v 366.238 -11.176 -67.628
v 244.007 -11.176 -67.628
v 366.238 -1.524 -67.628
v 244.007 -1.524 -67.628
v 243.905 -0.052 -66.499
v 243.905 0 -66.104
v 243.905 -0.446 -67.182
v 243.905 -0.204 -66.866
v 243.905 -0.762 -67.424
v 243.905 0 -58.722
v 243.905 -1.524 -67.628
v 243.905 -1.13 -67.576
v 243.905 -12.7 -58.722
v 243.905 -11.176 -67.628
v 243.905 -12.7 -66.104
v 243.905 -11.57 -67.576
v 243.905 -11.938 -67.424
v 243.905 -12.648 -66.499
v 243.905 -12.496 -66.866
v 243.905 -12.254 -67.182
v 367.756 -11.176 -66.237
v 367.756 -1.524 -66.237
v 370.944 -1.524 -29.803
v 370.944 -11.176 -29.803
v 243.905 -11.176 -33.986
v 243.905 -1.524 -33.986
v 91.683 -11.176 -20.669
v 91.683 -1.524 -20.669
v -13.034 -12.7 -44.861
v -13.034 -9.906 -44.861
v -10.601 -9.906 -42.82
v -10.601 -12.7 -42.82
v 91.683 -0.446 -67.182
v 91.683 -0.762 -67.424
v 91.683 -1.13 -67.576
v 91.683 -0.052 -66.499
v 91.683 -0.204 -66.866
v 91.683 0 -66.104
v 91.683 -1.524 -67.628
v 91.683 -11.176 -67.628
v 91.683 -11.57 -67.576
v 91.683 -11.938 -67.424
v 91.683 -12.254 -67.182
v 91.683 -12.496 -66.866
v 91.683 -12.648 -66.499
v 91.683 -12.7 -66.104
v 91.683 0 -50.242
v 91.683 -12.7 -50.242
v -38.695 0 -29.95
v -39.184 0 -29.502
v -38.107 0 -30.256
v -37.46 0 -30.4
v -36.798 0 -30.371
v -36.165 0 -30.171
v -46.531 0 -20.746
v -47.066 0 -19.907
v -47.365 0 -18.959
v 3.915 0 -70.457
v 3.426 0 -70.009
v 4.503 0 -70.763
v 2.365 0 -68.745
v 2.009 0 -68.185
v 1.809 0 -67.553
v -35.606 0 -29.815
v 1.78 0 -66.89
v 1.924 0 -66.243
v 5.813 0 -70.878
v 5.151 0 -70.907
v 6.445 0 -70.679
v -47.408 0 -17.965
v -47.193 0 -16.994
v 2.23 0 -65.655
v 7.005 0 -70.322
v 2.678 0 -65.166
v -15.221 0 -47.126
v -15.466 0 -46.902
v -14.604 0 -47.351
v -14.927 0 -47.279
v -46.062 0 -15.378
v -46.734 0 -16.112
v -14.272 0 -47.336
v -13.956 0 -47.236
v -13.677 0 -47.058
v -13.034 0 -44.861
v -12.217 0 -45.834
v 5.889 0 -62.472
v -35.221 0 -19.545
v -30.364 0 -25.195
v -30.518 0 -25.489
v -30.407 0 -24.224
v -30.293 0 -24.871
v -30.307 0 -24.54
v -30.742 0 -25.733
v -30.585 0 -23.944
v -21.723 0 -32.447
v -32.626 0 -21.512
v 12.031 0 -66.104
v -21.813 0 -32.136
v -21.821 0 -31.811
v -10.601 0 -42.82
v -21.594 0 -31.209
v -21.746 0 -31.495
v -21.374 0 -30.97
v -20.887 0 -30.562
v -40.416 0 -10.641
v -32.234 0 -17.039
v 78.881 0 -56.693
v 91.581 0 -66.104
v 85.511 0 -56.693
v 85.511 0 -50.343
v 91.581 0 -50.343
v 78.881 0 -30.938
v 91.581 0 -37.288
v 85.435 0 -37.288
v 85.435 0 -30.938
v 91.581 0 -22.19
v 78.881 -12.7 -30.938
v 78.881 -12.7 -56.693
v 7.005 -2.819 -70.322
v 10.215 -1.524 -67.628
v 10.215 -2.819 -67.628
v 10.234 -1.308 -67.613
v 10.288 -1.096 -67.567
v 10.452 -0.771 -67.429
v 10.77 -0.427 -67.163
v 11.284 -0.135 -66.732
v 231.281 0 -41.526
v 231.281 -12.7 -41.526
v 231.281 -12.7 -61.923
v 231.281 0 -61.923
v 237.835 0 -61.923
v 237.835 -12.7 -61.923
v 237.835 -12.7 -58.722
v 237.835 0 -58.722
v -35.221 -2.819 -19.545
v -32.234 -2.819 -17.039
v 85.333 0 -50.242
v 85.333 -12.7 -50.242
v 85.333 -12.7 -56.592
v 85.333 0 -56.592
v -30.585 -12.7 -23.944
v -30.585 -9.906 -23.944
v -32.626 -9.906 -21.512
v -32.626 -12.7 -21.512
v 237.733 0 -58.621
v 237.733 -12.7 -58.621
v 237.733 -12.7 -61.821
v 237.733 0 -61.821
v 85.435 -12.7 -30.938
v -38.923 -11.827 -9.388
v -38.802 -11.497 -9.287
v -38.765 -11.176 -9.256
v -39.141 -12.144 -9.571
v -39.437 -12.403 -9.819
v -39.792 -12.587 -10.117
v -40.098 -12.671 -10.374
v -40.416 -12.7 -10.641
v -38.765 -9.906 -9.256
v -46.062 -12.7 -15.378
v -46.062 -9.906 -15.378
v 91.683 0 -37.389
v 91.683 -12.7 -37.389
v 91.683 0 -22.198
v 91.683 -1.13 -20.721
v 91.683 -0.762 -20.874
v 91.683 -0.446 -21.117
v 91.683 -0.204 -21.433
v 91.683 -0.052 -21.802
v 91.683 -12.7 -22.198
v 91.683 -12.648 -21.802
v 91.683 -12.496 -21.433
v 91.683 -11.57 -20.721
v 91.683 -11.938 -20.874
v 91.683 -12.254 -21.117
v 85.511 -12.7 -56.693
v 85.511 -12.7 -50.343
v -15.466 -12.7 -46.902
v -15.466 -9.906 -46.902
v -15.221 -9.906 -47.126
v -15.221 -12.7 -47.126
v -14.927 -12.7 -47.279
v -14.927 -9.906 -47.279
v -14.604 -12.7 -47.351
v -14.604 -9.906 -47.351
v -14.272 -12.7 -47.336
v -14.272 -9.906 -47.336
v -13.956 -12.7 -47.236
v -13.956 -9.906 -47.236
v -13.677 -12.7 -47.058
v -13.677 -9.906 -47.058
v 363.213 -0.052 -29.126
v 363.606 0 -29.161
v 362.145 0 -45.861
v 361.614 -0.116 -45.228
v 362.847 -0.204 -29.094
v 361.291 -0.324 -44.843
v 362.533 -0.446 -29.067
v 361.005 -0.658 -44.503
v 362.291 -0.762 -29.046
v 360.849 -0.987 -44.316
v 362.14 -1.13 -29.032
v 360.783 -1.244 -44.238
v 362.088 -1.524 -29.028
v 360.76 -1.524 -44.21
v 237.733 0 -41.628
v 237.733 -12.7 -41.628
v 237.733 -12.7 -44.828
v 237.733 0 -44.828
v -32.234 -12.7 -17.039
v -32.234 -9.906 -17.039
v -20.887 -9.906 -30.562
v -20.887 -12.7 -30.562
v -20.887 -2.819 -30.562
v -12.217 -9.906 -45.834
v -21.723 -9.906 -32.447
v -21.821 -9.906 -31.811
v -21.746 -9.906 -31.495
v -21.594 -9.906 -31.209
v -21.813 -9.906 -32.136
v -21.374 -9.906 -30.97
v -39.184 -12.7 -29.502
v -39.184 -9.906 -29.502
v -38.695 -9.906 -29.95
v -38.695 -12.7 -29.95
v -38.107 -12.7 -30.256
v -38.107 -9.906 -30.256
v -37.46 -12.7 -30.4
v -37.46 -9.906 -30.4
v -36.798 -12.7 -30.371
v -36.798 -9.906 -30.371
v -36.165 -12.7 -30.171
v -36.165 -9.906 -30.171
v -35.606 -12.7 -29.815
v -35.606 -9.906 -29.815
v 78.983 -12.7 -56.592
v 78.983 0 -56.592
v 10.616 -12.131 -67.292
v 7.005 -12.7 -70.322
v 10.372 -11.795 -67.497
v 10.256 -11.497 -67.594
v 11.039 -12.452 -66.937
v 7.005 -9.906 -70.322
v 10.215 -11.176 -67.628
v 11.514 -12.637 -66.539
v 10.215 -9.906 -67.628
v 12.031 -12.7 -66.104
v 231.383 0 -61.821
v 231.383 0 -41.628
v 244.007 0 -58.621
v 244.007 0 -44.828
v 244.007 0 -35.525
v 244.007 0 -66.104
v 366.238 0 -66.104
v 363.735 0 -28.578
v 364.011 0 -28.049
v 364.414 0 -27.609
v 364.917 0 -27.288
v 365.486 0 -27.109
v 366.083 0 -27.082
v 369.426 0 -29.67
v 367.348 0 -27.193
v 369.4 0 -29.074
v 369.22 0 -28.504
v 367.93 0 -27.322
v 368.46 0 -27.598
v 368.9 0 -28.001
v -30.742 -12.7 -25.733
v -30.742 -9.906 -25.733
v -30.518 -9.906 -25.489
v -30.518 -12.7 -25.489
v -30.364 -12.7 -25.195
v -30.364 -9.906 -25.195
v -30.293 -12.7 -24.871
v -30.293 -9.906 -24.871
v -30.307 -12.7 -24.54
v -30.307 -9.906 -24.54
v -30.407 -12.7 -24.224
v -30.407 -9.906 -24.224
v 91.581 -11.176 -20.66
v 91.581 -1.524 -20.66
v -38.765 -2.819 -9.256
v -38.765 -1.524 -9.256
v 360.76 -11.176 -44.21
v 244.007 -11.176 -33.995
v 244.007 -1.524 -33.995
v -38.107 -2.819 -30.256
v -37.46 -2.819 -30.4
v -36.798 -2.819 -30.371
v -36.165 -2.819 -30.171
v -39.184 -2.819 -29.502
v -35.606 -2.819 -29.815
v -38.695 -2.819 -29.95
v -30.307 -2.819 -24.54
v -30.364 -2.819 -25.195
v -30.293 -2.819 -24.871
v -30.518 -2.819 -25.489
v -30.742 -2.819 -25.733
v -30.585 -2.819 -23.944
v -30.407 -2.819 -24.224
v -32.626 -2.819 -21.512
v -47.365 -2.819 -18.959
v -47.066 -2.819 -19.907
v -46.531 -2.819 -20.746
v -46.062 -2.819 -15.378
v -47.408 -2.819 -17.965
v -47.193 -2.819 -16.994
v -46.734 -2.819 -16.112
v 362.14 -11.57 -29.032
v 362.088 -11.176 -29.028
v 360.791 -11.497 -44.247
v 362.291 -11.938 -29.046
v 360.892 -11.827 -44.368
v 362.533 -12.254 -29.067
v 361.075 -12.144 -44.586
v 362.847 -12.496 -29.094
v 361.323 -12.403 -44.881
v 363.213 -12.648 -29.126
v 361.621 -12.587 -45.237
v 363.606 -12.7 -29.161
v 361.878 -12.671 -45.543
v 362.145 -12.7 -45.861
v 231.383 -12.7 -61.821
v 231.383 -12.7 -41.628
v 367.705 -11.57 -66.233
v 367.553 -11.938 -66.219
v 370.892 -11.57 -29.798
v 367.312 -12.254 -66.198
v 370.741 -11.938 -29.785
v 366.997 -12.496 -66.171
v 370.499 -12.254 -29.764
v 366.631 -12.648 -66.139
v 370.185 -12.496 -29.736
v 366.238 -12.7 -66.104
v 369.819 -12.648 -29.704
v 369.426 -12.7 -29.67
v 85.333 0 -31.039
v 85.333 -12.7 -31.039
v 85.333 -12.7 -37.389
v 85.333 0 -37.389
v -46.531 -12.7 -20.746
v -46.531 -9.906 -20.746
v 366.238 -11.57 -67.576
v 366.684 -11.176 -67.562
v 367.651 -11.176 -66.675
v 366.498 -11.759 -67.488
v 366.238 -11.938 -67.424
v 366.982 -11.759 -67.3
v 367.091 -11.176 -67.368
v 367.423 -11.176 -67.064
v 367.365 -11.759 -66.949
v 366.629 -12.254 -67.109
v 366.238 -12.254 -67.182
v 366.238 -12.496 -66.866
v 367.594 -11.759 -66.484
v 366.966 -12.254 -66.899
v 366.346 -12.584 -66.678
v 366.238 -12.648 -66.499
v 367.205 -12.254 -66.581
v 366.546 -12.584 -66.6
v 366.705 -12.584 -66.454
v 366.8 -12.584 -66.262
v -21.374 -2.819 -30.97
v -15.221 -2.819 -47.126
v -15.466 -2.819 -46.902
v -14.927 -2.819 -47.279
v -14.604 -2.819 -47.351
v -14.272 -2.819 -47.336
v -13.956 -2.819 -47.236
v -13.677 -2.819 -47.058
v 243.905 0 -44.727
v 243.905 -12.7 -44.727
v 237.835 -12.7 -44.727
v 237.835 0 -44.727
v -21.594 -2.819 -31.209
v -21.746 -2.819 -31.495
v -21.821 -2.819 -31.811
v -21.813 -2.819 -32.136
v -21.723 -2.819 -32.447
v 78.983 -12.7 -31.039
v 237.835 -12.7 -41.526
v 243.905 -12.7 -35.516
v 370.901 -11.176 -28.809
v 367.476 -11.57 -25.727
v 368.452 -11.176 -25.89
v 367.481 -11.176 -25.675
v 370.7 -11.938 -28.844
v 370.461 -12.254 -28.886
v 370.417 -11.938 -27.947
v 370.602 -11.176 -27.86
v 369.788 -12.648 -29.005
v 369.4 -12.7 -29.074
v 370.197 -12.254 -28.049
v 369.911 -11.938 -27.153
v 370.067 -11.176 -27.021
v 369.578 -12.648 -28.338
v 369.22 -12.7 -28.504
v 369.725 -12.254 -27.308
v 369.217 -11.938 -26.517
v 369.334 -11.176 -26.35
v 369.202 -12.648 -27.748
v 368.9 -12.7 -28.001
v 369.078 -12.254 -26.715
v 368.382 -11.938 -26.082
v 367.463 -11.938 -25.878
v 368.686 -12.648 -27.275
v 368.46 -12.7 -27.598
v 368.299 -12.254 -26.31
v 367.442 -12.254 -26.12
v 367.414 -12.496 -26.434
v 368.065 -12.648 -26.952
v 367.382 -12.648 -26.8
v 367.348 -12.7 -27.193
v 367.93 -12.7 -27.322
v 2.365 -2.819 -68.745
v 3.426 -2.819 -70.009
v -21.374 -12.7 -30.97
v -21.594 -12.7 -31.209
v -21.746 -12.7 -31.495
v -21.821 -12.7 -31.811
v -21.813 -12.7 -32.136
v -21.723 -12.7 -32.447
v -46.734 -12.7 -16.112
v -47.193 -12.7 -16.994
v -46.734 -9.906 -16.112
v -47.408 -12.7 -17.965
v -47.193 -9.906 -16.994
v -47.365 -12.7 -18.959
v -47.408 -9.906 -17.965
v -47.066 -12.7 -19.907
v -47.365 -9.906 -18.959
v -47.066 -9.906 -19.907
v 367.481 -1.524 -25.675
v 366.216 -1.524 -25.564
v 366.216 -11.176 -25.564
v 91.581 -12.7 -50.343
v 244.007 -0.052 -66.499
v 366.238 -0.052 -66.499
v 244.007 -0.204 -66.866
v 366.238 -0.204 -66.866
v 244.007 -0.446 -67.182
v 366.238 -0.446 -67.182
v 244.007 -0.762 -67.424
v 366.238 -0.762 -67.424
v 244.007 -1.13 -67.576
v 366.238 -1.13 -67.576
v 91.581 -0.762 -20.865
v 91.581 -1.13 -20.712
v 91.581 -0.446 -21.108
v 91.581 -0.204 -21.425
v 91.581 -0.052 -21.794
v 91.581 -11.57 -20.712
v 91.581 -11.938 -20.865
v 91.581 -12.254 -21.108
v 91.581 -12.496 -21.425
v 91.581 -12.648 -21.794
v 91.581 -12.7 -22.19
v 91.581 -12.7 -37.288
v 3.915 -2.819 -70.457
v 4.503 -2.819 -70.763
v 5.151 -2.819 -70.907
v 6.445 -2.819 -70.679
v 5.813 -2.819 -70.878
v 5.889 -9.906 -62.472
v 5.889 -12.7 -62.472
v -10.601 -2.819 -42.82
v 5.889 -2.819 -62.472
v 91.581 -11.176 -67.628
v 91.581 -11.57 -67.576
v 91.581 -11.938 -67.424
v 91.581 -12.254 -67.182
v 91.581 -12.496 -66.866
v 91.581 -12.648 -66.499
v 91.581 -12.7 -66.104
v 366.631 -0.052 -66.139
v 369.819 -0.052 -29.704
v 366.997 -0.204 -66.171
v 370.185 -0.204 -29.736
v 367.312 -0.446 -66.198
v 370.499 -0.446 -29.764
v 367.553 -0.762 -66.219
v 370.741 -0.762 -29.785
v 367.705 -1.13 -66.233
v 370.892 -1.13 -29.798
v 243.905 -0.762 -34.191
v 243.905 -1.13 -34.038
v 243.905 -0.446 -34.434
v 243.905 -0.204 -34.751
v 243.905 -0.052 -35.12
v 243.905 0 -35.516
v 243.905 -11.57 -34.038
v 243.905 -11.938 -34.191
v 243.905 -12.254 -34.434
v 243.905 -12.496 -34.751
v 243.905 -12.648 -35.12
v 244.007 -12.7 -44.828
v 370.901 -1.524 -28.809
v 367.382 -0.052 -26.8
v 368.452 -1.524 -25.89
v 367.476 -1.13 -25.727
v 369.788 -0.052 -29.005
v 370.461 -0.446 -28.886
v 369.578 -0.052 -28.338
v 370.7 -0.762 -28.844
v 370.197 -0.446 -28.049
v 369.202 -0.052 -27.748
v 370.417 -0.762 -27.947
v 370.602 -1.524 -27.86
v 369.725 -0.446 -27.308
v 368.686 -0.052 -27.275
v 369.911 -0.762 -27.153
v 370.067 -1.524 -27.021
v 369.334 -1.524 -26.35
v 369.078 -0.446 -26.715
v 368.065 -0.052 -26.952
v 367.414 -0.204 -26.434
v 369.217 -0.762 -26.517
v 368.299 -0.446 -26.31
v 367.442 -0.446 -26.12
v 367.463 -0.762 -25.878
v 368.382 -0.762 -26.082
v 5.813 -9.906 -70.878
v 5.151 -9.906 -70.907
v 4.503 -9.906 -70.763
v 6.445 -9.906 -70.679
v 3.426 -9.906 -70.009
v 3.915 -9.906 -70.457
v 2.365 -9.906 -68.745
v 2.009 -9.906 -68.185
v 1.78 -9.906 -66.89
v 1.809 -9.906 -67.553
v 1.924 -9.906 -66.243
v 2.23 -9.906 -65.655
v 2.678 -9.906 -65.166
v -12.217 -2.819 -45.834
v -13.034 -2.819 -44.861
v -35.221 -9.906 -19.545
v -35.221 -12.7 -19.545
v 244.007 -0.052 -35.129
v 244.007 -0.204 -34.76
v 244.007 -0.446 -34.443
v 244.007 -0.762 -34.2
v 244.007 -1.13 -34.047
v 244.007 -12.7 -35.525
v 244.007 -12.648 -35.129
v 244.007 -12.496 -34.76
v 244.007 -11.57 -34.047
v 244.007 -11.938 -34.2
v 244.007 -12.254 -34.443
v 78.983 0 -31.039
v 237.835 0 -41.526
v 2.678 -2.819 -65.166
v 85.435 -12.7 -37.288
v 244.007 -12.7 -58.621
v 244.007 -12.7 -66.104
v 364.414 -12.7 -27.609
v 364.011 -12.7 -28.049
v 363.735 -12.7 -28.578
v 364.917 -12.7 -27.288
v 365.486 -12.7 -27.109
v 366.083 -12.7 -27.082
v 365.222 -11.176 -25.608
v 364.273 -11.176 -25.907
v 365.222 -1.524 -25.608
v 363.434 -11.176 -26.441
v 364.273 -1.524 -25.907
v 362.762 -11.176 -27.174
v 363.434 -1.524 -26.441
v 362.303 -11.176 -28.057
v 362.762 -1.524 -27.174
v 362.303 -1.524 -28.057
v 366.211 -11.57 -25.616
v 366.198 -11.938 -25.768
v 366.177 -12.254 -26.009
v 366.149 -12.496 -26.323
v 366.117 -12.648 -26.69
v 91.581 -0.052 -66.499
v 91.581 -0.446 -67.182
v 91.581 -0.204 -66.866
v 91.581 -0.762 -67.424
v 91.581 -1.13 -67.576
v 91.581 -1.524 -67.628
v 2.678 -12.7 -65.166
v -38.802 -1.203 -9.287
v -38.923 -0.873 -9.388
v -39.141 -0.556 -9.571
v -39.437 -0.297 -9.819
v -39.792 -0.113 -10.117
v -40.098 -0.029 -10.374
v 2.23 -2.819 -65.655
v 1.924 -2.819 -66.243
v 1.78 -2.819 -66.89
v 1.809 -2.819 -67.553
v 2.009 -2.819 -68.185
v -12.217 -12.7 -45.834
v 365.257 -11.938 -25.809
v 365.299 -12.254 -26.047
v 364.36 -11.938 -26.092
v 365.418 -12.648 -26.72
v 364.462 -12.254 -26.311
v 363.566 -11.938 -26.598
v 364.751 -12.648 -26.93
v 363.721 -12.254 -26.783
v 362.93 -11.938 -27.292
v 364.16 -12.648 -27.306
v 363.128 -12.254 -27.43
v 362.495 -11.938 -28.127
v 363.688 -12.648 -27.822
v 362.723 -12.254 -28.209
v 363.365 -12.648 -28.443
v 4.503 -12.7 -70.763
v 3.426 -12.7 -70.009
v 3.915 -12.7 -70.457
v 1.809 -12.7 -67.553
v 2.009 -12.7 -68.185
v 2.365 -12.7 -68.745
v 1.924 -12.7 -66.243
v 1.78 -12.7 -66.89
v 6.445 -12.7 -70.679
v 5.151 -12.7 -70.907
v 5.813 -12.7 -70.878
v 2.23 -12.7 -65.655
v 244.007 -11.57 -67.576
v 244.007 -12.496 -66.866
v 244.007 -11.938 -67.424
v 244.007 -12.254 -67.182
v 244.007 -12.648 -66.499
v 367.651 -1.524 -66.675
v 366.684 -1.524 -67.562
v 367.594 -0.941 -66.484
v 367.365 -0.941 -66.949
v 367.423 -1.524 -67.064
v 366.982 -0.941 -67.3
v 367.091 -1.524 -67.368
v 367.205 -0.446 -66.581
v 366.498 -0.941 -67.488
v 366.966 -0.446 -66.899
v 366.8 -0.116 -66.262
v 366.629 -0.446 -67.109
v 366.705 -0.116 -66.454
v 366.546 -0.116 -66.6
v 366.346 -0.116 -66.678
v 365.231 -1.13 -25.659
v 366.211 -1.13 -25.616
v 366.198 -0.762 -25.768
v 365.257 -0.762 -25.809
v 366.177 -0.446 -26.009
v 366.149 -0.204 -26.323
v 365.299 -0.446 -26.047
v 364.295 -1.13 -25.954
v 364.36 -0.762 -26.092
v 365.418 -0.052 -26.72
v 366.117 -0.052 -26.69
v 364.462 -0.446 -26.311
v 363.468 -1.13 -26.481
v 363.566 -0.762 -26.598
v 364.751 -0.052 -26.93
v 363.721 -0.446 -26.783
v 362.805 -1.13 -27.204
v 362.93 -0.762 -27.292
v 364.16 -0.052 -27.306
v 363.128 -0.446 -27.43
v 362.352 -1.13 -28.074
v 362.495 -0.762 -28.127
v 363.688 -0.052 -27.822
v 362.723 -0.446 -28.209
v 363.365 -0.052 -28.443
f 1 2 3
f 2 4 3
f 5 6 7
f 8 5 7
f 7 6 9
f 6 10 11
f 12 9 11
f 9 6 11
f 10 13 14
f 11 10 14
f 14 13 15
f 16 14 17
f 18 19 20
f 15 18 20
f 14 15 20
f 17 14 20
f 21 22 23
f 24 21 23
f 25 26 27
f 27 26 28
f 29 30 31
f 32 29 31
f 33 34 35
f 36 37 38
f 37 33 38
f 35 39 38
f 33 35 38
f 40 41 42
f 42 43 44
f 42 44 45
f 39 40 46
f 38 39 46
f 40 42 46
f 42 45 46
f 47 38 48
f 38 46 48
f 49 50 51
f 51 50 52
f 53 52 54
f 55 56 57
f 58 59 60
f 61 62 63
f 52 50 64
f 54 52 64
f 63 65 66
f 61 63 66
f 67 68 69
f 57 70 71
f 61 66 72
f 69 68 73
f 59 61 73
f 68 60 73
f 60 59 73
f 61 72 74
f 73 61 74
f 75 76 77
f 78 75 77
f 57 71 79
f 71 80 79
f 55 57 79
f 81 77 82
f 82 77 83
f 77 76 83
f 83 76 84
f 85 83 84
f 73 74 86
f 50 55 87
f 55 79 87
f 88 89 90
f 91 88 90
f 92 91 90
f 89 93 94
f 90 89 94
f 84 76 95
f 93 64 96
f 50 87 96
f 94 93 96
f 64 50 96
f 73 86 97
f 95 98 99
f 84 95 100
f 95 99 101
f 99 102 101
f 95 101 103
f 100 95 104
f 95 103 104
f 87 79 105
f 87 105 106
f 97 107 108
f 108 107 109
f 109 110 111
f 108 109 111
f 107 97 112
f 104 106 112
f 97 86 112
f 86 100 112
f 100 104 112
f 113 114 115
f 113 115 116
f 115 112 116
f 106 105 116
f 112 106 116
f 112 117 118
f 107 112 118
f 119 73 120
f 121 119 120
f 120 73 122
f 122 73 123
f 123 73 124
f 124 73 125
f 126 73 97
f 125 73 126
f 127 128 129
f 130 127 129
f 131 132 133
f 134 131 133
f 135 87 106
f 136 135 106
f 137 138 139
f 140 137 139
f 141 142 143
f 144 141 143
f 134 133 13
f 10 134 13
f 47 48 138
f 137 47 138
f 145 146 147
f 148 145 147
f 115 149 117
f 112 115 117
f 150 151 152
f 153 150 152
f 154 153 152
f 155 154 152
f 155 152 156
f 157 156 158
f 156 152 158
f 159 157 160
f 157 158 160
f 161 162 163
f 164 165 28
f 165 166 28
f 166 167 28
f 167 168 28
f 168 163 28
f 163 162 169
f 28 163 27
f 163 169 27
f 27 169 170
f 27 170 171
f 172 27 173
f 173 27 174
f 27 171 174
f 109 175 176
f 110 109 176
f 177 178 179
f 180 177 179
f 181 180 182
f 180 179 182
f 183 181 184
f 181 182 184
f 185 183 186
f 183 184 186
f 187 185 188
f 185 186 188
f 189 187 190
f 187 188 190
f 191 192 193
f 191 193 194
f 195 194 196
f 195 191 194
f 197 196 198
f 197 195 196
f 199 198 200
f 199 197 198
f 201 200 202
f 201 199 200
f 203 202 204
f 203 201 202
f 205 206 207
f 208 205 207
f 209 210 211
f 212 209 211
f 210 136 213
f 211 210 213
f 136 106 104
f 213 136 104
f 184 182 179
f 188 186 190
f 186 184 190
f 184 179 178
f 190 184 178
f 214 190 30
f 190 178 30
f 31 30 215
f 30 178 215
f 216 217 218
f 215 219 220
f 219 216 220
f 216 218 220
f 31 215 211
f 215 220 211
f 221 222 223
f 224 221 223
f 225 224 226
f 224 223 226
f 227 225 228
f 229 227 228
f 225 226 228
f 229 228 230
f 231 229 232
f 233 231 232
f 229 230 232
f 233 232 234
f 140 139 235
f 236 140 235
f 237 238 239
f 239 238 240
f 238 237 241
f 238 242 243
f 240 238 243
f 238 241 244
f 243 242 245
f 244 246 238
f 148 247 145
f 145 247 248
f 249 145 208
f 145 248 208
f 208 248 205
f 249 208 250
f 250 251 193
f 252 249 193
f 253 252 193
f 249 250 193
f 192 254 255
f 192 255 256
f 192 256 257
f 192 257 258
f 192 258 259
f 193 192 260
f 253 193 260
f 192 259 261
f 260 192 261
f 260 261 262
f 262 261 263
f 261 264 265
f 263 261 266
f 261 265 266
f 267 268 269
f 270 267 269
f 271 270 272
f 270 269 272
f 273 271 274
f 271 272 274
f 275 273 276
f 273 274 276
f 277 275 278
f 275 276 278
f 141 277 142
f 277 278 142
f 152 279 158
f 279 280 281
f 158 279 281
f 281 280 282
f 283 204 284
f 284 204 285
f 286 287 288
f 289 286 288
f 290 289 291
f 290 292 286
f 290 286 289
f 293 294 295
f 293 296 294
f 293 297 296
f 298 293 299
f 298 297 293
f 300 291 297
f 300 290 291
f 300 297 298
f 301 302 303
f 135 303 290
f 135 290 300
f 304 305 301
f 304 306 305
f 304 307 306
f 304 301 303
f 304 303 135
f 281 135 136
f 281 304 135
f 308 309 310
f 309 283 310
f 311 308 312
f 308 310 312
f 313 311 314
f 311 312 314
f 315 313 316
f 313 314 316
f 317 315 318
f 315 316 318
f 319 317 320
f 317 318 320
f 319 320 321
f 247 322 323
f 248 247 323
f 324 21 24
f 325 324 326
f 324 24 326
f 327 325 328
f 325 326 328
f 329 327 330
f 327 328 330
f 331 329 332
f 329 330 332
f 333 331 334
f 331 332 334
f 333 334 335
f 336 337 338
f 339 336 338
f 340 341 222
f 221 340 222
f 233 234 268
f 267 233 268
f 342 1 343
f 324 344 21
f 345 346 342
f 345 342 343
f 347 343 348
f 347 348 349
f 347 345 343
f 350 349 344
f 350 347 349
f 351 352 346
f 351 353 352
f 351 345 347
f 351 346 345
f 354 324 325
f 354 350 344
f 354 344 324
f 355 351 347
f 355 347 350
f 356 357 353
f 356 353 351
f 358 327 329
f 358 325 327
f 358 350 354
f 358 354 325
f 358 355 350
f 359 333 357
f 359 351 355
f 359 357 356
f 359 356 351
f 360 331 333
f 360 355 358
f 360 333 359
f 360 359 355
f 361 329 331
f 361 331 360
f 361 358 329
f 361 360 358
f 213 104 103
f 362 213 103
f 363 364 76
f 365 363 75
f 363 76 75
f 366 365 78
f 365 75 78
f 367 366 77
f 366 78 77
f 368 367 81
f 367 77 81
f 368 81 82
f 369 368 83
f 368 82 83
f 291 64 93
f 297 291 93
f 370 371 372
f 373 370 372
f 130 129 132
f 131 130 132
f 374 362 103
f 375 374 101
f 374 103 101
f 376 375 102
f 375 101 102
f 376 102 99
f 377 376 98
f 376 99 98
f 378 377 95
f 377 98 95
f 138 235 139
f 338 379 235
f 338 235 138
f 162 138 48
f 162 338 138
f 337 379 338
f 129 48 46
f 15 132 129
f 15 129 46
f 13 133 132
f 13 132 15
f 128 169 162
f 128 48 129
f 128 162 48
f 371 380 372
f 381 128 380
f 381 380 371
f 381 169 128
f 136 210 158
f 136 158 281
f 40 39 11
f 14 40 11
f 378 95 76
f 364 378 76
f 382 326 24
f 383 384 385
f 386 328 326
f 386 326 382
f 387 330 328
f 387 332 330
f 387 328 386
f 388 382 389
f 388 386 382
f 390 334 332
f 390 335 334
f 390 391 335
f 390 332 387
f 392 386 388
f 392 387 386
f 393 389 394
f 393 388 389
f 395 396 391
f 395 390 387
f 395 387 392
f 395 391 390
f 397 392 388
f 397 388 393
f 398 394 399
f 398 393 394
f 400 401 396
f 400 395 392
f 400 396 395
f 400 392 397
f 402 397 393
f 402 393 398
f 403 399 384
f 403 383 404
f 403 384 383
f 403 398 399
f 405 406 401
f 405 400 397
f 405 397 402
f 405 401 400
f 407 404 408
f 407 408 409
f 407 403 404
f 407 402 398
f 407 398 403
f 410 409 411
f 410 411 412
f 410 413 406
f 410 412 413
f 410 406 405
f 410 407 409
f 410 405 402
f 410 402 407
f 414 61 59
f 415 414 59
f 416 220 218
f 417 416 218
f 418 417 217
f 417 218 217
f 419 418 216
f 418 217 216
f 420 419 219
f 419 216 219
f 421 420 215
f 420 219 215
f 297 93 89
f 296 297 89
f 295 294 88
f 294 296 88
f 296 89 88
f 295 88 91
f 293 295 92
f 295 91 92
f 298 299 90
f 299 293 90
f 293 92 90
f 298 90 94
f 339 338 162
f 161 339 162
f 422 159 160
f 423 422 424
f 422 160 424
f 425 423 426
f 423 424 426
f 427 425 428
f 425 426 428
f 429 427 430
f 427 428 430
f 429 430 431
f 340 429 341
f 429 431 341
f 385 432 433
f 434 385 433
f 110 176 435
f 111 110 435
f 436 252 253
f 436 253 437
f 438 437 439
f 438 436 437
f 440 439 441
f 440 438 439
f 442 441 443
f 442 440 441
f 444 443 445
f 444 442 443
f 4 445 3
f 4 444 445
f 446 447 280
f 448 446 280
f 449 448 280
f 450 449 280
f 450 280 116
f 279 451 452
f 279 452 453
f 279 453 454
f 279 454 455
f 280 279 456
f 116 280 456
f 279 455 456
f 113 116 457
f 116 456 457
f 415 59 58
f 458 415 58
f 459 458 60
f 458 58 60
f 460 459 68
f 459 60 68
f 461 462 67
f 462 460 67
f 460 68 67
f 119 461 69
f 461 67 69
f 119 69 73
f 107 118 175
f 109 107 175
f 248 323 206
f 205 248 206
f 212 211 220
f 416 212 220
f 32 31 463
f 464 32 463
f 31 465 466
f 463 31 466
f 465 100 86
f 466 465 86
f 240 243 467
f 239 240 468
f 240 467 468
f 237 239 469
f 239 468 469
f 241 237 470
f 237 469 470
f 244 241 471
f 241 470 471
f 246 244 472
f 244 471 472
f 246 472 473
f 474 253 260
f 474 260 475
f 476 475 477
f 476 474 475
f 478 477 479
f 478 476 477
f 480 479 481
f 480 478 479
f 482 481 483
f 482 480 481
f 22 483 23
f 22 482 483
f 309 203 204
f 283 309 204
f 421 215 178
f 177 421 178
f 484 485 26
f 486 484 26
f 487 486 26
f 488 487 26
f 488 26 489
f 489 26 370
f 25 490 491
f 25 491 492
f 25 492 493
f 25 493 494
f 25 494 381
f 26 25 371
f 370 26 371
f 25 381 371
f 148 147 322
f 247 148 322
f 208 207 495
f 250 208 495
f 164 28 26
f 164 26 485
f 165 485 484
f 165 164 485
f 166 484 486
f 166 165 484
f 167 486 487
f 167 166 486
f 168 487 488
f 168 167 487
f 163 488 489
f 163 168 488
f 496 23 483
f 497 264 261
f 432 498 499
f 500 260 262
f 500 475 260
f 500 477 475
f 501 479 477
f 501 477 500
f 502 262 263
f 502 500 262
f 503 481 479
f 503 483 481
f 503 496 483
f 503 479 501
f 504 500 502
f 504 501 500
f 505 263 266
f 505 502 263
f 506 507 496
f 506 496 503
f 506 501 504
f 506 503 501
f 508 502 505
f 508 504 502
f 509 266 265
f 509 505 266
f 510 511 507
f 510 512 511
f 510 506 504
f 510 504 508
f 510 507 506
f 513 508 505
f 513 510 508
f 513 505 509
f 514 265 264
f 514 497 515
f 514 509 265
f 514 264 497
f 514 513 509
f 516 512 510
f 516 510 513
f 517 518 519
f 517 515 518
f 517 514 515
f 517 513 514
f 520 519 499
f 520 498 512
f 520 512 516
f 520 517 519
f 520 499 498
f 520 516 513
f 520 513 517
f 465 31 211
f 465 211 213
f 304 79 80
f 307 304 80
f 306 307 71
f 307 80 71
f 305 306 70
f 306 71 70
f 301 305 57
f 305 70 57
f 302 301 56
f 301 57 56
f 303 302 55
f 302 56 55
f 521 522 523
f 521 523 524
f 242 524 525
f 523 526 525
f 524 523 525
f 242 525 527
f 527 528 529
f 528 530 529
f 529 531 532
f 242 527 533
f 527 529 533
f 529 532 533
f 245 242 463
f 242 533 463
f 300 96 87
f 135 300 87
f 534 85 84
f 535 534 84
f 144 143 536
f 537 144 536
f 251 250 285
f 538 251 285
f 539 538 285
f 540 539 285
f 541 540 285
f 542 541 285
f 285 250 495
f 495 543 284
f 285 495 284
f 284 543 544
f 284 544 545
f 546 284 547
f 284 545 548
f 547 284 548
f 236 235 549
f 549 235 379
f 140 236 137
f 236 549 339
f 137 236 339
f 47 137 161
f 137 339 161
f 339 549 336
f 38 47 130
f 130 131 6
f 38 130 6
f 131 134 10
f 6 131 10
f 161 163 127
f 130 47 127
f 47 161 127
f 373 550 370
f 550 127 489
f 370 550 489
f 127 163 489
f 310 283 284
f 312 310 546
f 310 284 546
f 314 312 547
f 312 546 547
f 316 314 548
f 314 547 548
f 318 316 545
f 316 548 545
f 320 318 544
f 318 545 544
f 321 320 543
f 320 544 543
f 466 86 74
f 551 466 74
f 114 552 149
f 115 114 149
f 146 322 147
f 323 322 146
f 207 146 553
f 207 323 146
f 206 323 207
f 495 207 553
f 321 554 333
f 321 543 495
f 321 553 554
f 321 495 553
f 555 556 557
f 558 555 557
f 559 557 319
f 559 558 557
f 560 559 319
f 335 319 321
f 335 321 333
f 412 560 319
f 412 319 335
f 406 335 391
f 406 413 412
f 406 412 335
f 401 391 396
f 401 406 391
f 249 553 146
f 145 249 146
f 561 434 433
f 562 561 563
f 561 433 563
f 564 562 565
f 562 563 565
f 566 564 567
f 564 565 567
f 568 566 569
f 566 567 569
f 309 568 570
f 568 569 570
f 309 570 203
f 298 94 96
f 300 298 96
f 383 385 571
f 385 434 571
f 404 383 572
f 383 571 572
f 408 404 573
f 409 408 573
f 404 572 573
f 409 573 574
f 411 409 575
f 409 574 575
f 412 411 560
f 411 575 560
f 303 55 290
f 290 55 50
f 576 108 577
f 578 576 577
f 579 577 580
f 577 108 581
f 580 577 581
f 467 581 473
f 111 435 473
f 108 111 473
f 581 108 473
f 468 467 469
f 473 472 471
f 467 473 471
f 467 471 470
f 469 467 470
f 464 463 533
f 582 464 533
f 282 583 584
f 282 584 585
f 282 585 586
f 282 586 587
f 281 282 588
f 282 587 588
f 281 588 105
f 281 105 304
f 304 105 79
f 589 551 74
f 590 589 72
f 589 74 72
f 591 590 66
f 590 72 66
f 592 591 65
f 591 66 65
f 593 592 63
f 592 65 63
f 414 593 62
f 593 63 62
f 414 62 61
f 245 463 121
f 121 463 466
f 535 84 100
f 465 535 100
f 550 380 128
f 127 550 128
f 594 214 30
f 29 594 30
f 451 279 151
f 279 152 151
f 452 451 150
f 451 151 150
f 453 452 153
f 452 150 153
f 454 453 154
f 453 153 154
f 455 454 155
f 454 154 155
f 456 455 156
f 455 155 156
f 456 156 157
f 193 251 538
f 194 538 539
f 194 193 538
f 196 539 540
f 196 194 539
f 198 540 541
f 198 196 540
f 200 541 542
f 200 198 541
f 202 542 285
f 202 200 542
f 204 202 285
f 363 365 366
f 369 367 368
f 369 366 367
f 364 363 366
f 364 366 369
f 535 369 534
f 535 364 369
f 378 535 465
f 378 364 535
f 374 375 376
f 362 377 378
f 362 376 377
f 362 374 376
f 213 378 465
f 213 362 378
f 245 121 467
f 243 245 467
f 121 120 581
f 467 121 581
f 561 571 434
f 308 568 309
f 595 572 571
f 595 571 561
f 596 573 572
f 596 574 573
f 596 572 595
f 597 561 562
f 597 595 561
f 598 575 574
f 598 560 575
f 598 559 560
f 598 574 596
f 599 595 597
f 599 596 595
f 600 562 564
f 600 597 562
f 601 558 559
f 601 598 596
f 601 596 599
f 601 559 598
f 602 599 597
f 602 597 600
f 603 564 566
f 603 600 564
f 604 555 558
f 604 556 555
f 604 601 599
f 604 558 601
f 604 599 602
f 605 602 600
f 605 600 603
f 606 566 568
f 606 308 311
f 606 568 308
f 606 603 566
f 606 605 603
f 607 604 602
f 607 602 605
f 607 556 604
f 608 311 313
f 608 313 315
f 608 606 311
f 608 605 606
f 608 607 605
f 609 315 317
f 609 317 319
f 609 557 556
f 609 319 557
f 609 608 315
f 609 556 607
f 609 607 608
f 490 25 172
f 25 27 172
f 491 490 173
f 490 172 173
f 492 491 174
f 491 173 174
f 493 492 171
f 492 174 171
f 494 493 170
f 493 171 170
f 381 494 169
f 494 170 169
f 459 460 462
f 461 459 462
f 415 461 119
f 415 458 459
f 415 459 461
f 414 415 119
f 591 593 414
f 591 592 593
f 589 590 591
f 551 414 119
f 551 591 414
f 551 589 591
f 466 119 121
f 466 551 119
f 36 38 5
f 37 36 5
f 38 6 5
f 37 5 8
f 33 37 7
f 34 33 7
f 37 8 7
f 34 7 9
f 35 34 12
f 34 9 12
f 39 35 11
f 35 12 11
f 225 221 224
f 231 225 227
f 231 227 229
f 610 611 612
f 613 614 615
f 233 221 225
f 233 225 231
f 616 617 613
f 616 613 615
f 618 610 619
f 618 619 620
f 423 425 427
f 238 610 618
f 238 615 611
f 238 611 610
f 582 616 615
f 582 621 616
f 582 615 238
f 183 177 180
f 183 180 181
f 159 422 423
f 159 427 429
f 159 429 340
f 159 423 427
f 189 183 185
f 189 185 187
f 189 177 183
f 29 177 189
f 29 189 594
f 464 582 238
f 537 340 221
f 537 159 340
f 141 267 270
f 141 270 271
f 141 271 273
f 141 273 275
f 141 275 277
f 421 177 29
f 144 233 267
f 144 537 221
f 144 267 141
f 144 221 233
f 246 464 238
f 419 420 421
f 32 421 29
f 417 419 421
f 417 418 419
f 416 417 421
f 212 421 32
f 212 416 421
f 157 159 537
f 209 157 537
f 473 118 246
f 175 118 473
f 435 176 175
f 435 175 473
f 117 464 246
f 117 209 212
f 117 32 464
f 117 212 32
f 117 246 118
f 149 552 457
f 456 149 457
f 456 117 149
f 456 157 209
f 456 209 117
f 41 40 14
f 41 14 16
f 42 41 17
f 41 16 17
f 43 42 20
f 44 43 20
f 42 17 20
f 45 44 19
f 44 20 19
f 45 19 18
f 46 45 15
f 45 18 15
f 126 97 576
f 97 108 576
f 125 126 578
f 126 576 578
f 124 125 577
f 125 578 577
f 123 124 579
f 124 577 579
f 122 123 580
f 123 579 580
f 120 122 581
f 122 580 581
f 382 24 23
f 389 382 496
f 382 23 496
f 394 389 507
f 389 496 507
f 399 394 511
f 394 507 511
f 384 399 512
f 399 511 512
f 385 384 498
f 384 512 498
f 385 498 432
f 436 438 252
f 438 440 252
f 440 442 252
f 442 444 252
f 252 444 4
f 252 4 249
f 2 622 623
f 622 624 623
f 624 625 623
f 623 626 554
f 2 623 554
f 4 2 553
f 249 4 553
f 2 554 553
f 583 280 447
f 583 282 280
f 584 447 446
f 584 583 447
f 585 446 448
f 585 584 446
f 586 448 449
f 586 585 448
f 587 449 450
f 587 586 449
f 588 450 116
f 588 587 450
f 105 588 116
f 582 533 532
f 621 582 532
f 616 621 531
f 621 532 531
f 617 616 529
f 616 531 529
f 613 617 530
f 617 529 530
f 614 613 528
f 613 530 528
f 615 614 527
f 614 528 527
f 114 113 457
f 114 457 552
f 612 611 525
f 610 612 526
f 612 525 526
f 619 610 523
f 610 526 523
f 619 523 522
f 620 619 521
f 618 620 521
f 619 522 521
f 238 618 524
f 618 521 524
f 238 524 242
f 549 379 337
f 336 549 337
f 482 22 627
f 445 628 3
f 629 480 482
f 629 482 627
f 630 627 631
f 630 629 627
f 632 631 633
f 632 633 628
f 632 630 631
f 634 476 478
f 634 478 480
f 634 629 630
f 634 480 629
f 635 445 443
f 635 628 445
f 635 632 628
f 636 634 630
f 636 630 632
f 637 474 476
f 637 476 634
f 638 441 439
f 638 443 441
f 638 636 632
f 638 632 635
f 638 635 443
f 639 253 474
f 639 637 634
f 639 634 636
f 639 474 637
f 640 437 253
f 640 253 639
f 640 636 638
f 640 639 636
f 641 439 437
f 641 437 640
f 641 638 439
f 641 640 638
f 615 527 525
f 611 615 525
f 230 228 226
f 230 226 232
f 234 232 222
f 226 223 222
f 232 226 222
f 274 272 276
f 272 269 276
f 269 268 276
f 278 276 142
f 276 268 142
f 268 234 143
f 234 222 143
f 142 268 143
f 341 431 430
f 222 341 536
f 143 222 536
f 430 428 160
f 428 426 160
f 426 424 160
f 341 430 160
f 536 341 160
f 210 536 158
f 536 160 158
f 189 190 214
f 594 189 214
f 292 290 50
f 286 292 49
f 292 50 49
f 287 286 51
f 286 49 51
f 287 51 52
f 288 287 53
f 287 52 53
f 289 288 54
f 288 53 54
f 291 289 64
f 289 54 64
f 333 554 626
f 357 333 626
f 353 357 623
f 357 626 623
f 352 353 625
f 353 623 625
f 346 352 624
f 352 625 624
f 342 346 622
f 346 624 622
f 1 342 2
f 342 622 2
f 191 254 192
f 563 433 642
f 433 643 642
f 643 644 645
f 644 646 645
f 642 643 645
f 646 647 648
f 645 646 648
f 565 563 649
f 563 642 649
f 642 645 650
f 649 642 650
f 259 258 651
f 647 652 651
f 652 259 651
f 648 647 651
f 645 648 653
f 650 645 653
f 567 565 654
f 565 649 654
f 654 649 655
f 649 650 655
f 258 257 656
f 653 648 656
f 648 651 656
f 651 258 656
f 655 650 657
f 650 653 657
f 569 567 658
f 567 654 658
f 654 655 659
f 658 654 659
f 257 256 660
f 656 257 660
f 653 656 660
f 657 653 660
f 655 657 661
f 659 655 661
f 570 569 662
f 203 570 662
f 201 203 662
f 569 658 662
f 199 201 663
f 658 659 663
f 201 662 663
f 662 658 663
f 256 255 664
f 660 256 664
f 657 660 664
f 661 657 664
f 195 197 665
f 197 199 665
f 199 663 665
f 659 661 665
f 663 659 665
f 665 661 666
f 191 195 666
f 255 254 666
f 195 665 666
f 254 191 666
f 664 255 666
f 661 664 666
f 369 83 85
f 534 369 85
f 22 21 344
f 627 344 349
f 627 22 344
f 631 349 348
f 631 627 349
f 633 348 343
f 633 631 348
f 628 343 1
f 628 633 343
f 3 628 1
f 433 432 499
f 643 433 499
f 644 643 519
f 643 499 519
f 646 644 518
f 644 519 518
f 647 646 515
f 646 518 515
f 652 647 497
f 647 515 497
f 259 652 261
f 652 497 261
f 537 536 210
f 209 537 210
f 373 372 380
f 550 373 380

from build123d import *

# Parameters (mm, degrees)
F1_DEPTH         = 12.7
F2_W             = 13.335
F2_H             = 7.0866
F3_DEPTH         = 93.472
F5_DEPTH         = 25.4
F7_R             = 1.524
F10_F1_R         = 1.524
F10_F2_R         = 1.524
F10_S1_F1_R      = 1.524
F10_S1_F2_R      = 1.524
F10_S2_T1_DEPTH  = 126.041432676
F10_S2_T3_DEPTH  = 1.27
F10_S2_T5_DEPTH  = 36.5738786888
F10_S2_T7_DEPTH  = 121.0088094258
F10_S2_T9_DEPTH  = 15.24
F10_S2_T11_DEPTH = 9.652
F10_S2_T16_DEPTH = 1.524
F10_S2_T22_DEPTH = 1.524
F10_S2_T26_ANGLE = 90
F10_S2_T28_ANGLE = 90
F10_S2_T33_DEPTH = 124.8188094258
F10_S2_T37_DEPTH = 19.05


# Not quite as in the source:
# - a fillet or chamfer that OpenCascade refuses, or shapes differently, is made with other operations: its cross-section is extruded or revolved along the edge and cut away or added
# - a feature of the source that left no trace in its solid (it failed there, or was rolled back) is left out


with BuildPart() as f1:
    # F0 (on Front) → F1 (new body)
    with BuildSketch(Plane.XZ):
        with BuildLine():
            ThreePointArc((-46.0617865298, -15.3783926414), (-47.4082675367, -17.9649585898), (-46.5313950652, -20.7460427626))
            Line((-46.5313950652, -20.7460427626), (-39.1843326865, -29.5019307475))
            ThreePointArc((-39.1843326865, -29.5019307475), (-37.4599553875, -30.399584752), (-35.6058992724, -29.8150031044))
            Line((-35.6058992724, -29.8150031044), (-30.7415170586, -25.7333017829))
            ThreePointArc((-30.7415170586, -25.7333017829), (-30.2926900563, -24.8711131334), (-30.5849808801, -23.9440850758))
            Line((-30.5849808801, -23.9440850758), (-32.6258315409, -21.5118939689))
            Line((-32.6258315409, -21.5118939689), (-35.2214163384, -19.5451800716))
            Line((-35.2214163384, -19.5451800716), (-32.2344910947, -17.0388522013))
            Line((-32.2344910947, -17.0388522013), (-20.8873614209, -30.5618347556))
            Line((-20.8873614209, -30.5618347556), (-21.3737996423, -30.9700048878))
            ThreePointArc((-21.3737996423, -30.9700048878), (-21.7934146066, -31.6507945747), (-21.722945379, -32.4474032641))
            Line((-21.722945379, -32.4474032641), (-15.4658563045, -46.9017792559))
            ThreePointArc((-15.4658563045, -46.9017792559), (-14.603667655, -47.3506062582), (-13.6766395974, -47.0583154344))
            Line((-13.6766395974, -47.0583154344), (-12.2173249333, -45.8338050379))
            Line((-12.2173249333, -45.8338050379), (-13.0336651976, -44.8609285952))
            Line((-13.0336651976, -44.8609285952), (-10.6014740907, -42.8200779344))
            Line((-10.6014740907, -42.8200779344), (5.8885992482, -62.4721820782))
            Line((5.8885992482, -62.4721820782), (2.6781069871, -65.1661049504))
            ThreePointArc((2.6781069871, -65.1661049504), (1.7804529825, -66.8904822493), (2.3650346302, -68.7445383645))
            Line((2.3650346302, -68.7445383645), (3.4262769738, -70.0092777401))
            ThreePointArc((3.4262769738, -70.0092777401), (5.1506542727, -70.9069317447), (7.0047103879, -70.322350097))
            Line((7.0047103879, -70.322350097), (10.215202649, -67.6284272248))
            Line((10.215202649, -67.6284272248), (367.6347867909, -67.6284272248))
            Line((367.6347867909, -67.6284272248), (370.9441223638, -29.8025485384))
            ThreePointArc((370.9441223638, -29.8025485384), (370.0672498924, -27.0214643656), (367.480683944, -25.6749833588))
            Line((367.480683944, -25.6749833588), (366.2155166774, -25.5642955655))
            ThreePointArc((366.2155166774, -25.5642955655), (363.4344325046, -26.4411680369), (362.0879514978, -29.0277339854))
            Line((362.0879514978, -29.0277339854), (360.7596979783, -44.2097411843))
            Line((360.7596979783, -44.2097411843), (-38.7652132091, -9.2558406592))
            Line((-38.7652132091, -9.2558406592), (-46.0617865298, -15.3783926414))
        make_face()
    extrude(amount=F1_DEPTH)

    # F2 (on face) → F3 (cut)
    with BuildSketch(Plane(origin=(-11.4592404683, 0, 13.6565909966), x_dir=(0.7660444431, 0, 0.6427876097), z_dir=(-0.6427876097, 0, 0.7660444431))):
        with Locations((-42.3129158581, -6.3627)):
            Rectangle(F2_W, F2_H)
    extrude(amount=-F3_DEPTH, mode=Mode.SUBTRACT)

    # F4 (on face) → F5 (cut)
    with BuildSketch(Plane.XZ.offset(12.7)):
        Polygon((91.5814654057, -20.6596973662), (91.6830654057, -20.6685862144), (91.6830654057, 1.1655155965), (91.5814654057, 1.1653002073), align=None)
        Polygon((91.5814654057, -67.6284272248), (91.6830654057, -67.6284272248), (91.6830654057, -50.2417070188), (85.3330660997, -50.2417070188), (85.3330660997, -56.5917070188), (78.9830660997, -56.5917070188), (78.9830660997, -31.0393070188), (85.3330660997, -31.0393070188), (85.3330660997, -37.3893070188), (91.6830654057, -37.3893070188), (91.6830654057, -20.6685862144), (91.5814654057, -20.6596973662), (91.5814654057, -37.2877070188), (85.4346660997, -37.2877070188), (85.4346660997, -30.9377070188), (78.8814660997, -30.9377070188), (78.8814660997, -56.6933070188), (85.5108660997, -56.6933070188), (85.5108660997, -50.3433070188), (91.5814654057, -50.3433070188), align=None)
        Polygon((243.9052654057, -33.9863030514), (244.0068654057, -33.9951918996), (244.0068654057, -9.7616507337), (243.9052654057, -9.7616507337), align=None)
        Polygon((243.9052654057, -58.7221217398), (243.9052654057, -67.6284272248), (244.0068654057, -67.6284272248), (244.0068654057, -58.6205217398), (237.7330654057, -58.6205217398), (237.7330654057, -61.8209217398), (231.3830654057, -61.8209217398), (231.3830654057, -41.6279271885), (237.7330654057, -41.6279271885), (237.7330654057, -44.8283271885), (244.0068654057, -44.8283271885), (244.0068654057, -33.9951918996), (243.9052654057, -33.9863030514), (243.9052654057, -44.7267271885), (237.8346654057, -44.7267271885), (237.8346654057, -41.5263271885), (231.2814654057, -41.5263271885), (231.2814654057, -61.9225217398), (237.8346654057, -61.9225217398), (237.8346654057, -58.7221217398), align=None)
    extrude(amount=-F5_DEPTH, mode=Mode.SUBTRACT)

    # F7
    f7_edges = [f1.edges().sort_by_distance(p)[0] for p in [
        (26.408126, -12.7, -14.957769),
        (167.794165, -12.7, -27.327445),
        (302.383282, -12.7, -39.102467),
        (361.423825, -12.7, -36.618738),
        (167.794165, -12.7, -67.628427),
        (50.898334, -12.7, -67.628427),
    ]]
    fillet(f7_edges, radius=F7_R)

    # F10: fillet of radius 1.524 on 2 edges, made by hand

    # F10_f1
    f10_f1_edges = [f1.edges().sort_by_distance(p)[0] for p in [
        (26.4081260983, 0, -14.9577690127),
    ]]
    fillet(f10_f1_edges, radius=F10_F1_R)

    # F10_f2
    f10_f2_edges = [f1.edges().sort_by_distance(p)[0] for p in [
        (50.8983340273, 0, -67.6284272248),
    ]]
    fillet(f10_f2_edges, radius=F10_F2_R)

    # F10#s1: fillet of radius 1.524 on 2 edges, made by hand

    # F10_s1_f1
    f10_s1_f1_edges = [f1.edges().sort_by_distance(p)[0] for p in [
        (167.7941654057, 0, -27.3274446329),
    ]]
    fillet(f10_s1_f1_edges, radius=F10_S1_F1_R)

    # F10_s1_f2
    f10_s1_f2_edges = [f1.edges().sort_by_distance(p)[0] for p in [
        (167.7941654057, 0, -67.6284272248),
    ]]
    fillet(f10_s1_f2_edges, radius=F10_S1_F2_R)

    # F10#s2: fillet of radius 1.524 on 9 edges, made by hand

    # F10_s2_s2 → F10_s2_t1 (cut)
    with BuildSketch(Plane.YZ.offset(240.1968654057)):
        with BuildLine():
            ThreePointArc((-12.7, -66.1044272248), (-12.2536307345, -67.1820579594), (-11.176, -67.6284272248))
            Line((-11.176, -67.6284272248), (-12.7, -67.6284272248))
            Line((-12.7, -67.6284272248), (-12.7, -66.1044272248))
        make_face()
        with BuildLine():
            ThreePointArc((0, -66.1044272248), (-0.4463692655, -67.1820579594), (-1.524, -67.6284272248))
            Line((-1.524, -67.6284272248), (0, -67.6284272248))
            Line((0, -67.6284272248), (0, -66.1044272248))
        make_face()
    extrude(amount=F10_S2_T1_DEPTH, mode=Mode.SUBTRACT)

    # F10_s2_s4 → F10_s2_t3 (cut)
    with BuildSketch(Plane(origin=(366.9184623231, 0, -32.1012058916), x_dir=(0, 1, 0), z_dir=(-0.9961946981, 0, 0.0871557427))):
        with BuildLine():
            ThreePointArc((-1.524, -6.4507696589), (-0.4463692655, -6.0044003935), (0, -4.9267696589))
            Line((0, -4.9267696589), (0, -6.4507696589))
            Line((0, -6.4507696589), (-1.524, -6.4507696589))
        make_face()
    extrude(amount=F10_S2_T3_DEPTH, mode=Mode.SUBTRACT)

    # F10_s2_s6 → F10_s2_t5 (cut)
    with BuildSketch(Plane(origin=(-2.9574653212, 0, -33.8039833053), x_dir=(0, 1, 0), z_dir=(0.0871557427, 0, 0.9961946981))):
        with BuildLine():
            ThreePointArc((0, -370.6060312408), (-0.4463692655, -371.6836619753), (-1.524, -372.1300312408))
            Line((-1.524, -372.1300312408), (0, -372.1300312408))
            Line((0, -372.1300312408), (0, -370.6060312408))
        make_face()
    extrude(amount=F10_S2_T5_DEPTH, mode=Mode.SUBTRACT)

    # F10_s2_s8 → F10_s2_t7 (cut)
    with BuildSketch(Plane(origin=(361.8577932568, 0, -31.6584547185), x_dir=(0, 1, 0), z_dir=(-0.9961946981, 0, 0.0871557427))):
        with BuildLine():
            ThreePointArc((0, 14.1232303411), (-0.4463692655, 13.0455996065), (-1.524, 12.5992303411))
            Line((-1.524, 12.5992303411), (0, 12.5992303411))
            Line((0, 12.5992303411), (0, 14.1232303411))
        make_face()
    extrude(amount=F10_S2_T7_DEPTH, mode=Mode.SUBTRACT)

    # F10_s2_s10 → F10_s2_t9 (cut)
    with BuildSketch(Plane(origin=(0.2301582411, 0, 2.6307207331), x_dir=(0, 1, 0), z_dir=(-0.0871557427, 0, -0.9961946981))):
        with BuildLine():
            ThreePointArc((0, 364.7640312408), (-0.4463692655, 363.6864005063), (-1.524, 363.2400312408))
            Line((-1.524, 363.2400312408), (0, 363.2400312408))
            Line((0, 363.2400312408), (0, 364.7640312408))
        make_face()
    extrude(amount=F10_S2_T9_DEPTH, mode=Mode.SUBTRACT)

    # F10_s2_s12 → F10_s2_t11 (cut)
    with BuildSketch(Plane.XZ.offset(1.524)):
        with BuildLine():
            ThreePointArc((367.7564988016, -66.2372525768), (367.2678975581, -67.2280378861), (366.2382980817, -67.6284272248))
            Line((366.2382980817, -67.6284272248), (367.6347867909, -67.6284272248))
            Line((367.6347867909, -67.6284272248), (367.7564988016, -66.2372525768))
        make_face()
    extrude(amount=F10_S2_T11_DEPTH, mode=Mode.SUBTRACT)


with BuildPart() as f10_s2_tool14:
    # F10_s2_s15 → F10_s2_t16 (new body)
    with BuildSketch(Plane.XZ.offset(11.176)):
        Polygon((366.2382980817, -66.1044272248), (367.7564988016, -66.2372525768), (367.6347867909, -67.6284272248), (366.2382980817, -67.6284272248), align=None)
    extrude(amount=F10_S2_T16_DEPTH)

    # F10_s2_s17 → F10_s2_t18 (revolve, cut)
    with BuildSketch(Plane(origin=(366.2382980817, -11.176, -66.1044272248), x_dir=(-0.6755902076, 0, 0.7372773368), z_dir=(0.7372773368, 0, 0.6755902076))):
        with BuildLine():
            ThreePointArc((0, -1.524), (1.524, 0), (0, 1.524))
            Line((0, 1.524), (0, -1.524))
        make_face()
    revolve(axis=Axis((366.2382980817, -11.176, -66.1044272248), (0, -1, 0)), mode=Mode.SUBTRACT)


with BuildPart() as f1_1:
    add(f1.part)

    # F10_s2_t13: cut F10_s2_tool14
    add(f10_s2_tool14.part, mode=Mode.SUBTRACT)


with BuildPart() as f10_s2_tool20:
    # F10_s2_s21 → F10_s2_t22 (new body)
    with BuildSketch(Plane.XZ.offset(1.524)):
        Polygon((366.2382980817, -66.1044272248), (367.7564988016, -66.2372525768), (367.6347867909, -67.6284272248), (366.2382980817, -67.6284272248), align=None)
    extrude(amount=-F10_S2_T22_DEPTH)

    # F10_s2_s23 → F10_s2_t24 (revolve, cut)
    with BuildSketch(Plane(origin=(366.2382980817, -1.524, -66.1044272248), x_dir=(-0.6755902076, 0, 0.7372773368), z_dir=(-0.7372773368, 0, -0.6755902076))):
        with BuildLine():
            ThreePointArc((0, -1.524), (1.524, 0), (0, 1.524))
            Line((0, 1.524), (0, -1.524))
        make_face()
    revolve(axis=Axis((366.2382980817, -1.524, -66.1044272248), (0, 1, 0)), mode=Mode.SUBTRACT)


with BuildPart() as f1_2:
    add(f1_1.part)

    # F10_s2_t19: cut F10_s2_tool20
    add(f10_s2_tool20.part, mode=Mode.SUBTRACT)

    # F10_s2_s25 → F10_s2_t26 (revolve, cut)
    with BuildSketch(Plane(origin=(365.6532950565, 0, -31.9905180983), x_dir=(0, 1, 0), z_dir=(0.9961946981, 0, -0.0871557427))):
        with BuildLine():
            ThreePointArc((-1.524, 6.4507696589), (-0.4463692655, 6.0044003935), (0, 4.9267696589))
            Line((0, 4.9267696589), (0, 6.4507696589))
            Line((0, 6.4507696589), (-1.524, 6.4507696589))
        make_face()
    revolve(axis=Axis((365.8834532975, 0, -29.3597973652), (0, -1, 0)), revolution_arc=F10_S2_T26_ANGLE, mode=Mode.SUBTRACT)

    # F10_s2_s27 → F10_s2_t28 (revolve, cut)
    with BuildSketch(Plane(origin=(0.2301582411, 0, 2.6307207331), x_dir=(0, 1, 0), z_dir=(-0.0871557427, 0, -0.9961946981))):
        with BuildLine():
            ThreePointArc((0, 370.6060312408), (-0.4463692655, 371.6836619753), (-1.524, 372.1300312408))
            Line((-1.524, 372.1300312408), (0, 372.1300312408))
            Line((0, 372.1300312408), (0, 370.6060312408))
        make_face()
    revolve(axis=Axis((367.1486205641, 0, -29.4704851585), (0, -1, 0)), revolution_arc=F10_S2_T28_ANGLE, mode=Mode.SUBTRACT)


with BuildPart() as f10_s2_tool31:
    # F10_s2_s32 → F10_s2_t33 (new body)
    with BuildSketch(Plane(origin=(365.6532950565, 0, -31.9905180983), x_dir=(0, 1, 0), z_dir=(-0.9961946981, 0, 0.0871557427))):
        with BuildLine():
            ThreePointArc((0, 14.1232303411), (-0.4463692655, 13.0455996065), (-1.524, 12.5992303411))
            Line((-1.524, 12.5992303411), (0, 12.5992303411))
            Line((0, 12.5992303411), (0, 14.1232303411))
        make_face()
    extrude(amount=F10_S2_T33_DEPTH)

    split(bisect_by=Plane(origin=(361.8577932568, 0, -31.6584547185), x_dir=(0, 1, 0), z_dir=(0.9961946981, 0, -0.0871557427)), keep=Keep.TOP)


with BuildPart() as f10_s2_tool35:
    # F10_s2_s36 → F10_s2_t37 (new body)
    with BuildSketch(Plane(origin=(0.2301582411, 0, 2.6307207331), x_dir=(0, 1, 0), z_dir=(-0.0871557427, 0, -0.9961946981))):
        with BuildLine():
            ThreePointArc((0, 364.7640312408), (-0.4463692655, 363.6864005063), (-1.524, 363.2400312408))
            Line((-1.524, 363.2400312408), (0, 363.2400312408))
            Line((0, 363.2400312408), (0, 364.7640312408))
        make_face()
    extrude(amount=F10_S2_T37_DEPTH)

    split(bisect_by=Plane(origin=(-1.0980952784, 0, -12.5512864658), x_dir=(0, 1, 0), z_dir=(-0.0871557427, 0, -0.9961946981)), keep=Keep.TOP)


with BuildPart() as f10_s2_tool31_1:
    add(f10_s2_tool31.part)

    # F10_s2_t39: intersect F10_s2_tool35
    add(f10_s2_tool35.part, mode=Mode.INTERSECT)


with BuildPart() as f1_3:
    add(f1_2.part)

    # F10_s2_t29: cut F10_s2_tool31
    add(f10_s2_tool31_1.part, mode=Mode.SUBTRACT)


solid = f1_3.part
